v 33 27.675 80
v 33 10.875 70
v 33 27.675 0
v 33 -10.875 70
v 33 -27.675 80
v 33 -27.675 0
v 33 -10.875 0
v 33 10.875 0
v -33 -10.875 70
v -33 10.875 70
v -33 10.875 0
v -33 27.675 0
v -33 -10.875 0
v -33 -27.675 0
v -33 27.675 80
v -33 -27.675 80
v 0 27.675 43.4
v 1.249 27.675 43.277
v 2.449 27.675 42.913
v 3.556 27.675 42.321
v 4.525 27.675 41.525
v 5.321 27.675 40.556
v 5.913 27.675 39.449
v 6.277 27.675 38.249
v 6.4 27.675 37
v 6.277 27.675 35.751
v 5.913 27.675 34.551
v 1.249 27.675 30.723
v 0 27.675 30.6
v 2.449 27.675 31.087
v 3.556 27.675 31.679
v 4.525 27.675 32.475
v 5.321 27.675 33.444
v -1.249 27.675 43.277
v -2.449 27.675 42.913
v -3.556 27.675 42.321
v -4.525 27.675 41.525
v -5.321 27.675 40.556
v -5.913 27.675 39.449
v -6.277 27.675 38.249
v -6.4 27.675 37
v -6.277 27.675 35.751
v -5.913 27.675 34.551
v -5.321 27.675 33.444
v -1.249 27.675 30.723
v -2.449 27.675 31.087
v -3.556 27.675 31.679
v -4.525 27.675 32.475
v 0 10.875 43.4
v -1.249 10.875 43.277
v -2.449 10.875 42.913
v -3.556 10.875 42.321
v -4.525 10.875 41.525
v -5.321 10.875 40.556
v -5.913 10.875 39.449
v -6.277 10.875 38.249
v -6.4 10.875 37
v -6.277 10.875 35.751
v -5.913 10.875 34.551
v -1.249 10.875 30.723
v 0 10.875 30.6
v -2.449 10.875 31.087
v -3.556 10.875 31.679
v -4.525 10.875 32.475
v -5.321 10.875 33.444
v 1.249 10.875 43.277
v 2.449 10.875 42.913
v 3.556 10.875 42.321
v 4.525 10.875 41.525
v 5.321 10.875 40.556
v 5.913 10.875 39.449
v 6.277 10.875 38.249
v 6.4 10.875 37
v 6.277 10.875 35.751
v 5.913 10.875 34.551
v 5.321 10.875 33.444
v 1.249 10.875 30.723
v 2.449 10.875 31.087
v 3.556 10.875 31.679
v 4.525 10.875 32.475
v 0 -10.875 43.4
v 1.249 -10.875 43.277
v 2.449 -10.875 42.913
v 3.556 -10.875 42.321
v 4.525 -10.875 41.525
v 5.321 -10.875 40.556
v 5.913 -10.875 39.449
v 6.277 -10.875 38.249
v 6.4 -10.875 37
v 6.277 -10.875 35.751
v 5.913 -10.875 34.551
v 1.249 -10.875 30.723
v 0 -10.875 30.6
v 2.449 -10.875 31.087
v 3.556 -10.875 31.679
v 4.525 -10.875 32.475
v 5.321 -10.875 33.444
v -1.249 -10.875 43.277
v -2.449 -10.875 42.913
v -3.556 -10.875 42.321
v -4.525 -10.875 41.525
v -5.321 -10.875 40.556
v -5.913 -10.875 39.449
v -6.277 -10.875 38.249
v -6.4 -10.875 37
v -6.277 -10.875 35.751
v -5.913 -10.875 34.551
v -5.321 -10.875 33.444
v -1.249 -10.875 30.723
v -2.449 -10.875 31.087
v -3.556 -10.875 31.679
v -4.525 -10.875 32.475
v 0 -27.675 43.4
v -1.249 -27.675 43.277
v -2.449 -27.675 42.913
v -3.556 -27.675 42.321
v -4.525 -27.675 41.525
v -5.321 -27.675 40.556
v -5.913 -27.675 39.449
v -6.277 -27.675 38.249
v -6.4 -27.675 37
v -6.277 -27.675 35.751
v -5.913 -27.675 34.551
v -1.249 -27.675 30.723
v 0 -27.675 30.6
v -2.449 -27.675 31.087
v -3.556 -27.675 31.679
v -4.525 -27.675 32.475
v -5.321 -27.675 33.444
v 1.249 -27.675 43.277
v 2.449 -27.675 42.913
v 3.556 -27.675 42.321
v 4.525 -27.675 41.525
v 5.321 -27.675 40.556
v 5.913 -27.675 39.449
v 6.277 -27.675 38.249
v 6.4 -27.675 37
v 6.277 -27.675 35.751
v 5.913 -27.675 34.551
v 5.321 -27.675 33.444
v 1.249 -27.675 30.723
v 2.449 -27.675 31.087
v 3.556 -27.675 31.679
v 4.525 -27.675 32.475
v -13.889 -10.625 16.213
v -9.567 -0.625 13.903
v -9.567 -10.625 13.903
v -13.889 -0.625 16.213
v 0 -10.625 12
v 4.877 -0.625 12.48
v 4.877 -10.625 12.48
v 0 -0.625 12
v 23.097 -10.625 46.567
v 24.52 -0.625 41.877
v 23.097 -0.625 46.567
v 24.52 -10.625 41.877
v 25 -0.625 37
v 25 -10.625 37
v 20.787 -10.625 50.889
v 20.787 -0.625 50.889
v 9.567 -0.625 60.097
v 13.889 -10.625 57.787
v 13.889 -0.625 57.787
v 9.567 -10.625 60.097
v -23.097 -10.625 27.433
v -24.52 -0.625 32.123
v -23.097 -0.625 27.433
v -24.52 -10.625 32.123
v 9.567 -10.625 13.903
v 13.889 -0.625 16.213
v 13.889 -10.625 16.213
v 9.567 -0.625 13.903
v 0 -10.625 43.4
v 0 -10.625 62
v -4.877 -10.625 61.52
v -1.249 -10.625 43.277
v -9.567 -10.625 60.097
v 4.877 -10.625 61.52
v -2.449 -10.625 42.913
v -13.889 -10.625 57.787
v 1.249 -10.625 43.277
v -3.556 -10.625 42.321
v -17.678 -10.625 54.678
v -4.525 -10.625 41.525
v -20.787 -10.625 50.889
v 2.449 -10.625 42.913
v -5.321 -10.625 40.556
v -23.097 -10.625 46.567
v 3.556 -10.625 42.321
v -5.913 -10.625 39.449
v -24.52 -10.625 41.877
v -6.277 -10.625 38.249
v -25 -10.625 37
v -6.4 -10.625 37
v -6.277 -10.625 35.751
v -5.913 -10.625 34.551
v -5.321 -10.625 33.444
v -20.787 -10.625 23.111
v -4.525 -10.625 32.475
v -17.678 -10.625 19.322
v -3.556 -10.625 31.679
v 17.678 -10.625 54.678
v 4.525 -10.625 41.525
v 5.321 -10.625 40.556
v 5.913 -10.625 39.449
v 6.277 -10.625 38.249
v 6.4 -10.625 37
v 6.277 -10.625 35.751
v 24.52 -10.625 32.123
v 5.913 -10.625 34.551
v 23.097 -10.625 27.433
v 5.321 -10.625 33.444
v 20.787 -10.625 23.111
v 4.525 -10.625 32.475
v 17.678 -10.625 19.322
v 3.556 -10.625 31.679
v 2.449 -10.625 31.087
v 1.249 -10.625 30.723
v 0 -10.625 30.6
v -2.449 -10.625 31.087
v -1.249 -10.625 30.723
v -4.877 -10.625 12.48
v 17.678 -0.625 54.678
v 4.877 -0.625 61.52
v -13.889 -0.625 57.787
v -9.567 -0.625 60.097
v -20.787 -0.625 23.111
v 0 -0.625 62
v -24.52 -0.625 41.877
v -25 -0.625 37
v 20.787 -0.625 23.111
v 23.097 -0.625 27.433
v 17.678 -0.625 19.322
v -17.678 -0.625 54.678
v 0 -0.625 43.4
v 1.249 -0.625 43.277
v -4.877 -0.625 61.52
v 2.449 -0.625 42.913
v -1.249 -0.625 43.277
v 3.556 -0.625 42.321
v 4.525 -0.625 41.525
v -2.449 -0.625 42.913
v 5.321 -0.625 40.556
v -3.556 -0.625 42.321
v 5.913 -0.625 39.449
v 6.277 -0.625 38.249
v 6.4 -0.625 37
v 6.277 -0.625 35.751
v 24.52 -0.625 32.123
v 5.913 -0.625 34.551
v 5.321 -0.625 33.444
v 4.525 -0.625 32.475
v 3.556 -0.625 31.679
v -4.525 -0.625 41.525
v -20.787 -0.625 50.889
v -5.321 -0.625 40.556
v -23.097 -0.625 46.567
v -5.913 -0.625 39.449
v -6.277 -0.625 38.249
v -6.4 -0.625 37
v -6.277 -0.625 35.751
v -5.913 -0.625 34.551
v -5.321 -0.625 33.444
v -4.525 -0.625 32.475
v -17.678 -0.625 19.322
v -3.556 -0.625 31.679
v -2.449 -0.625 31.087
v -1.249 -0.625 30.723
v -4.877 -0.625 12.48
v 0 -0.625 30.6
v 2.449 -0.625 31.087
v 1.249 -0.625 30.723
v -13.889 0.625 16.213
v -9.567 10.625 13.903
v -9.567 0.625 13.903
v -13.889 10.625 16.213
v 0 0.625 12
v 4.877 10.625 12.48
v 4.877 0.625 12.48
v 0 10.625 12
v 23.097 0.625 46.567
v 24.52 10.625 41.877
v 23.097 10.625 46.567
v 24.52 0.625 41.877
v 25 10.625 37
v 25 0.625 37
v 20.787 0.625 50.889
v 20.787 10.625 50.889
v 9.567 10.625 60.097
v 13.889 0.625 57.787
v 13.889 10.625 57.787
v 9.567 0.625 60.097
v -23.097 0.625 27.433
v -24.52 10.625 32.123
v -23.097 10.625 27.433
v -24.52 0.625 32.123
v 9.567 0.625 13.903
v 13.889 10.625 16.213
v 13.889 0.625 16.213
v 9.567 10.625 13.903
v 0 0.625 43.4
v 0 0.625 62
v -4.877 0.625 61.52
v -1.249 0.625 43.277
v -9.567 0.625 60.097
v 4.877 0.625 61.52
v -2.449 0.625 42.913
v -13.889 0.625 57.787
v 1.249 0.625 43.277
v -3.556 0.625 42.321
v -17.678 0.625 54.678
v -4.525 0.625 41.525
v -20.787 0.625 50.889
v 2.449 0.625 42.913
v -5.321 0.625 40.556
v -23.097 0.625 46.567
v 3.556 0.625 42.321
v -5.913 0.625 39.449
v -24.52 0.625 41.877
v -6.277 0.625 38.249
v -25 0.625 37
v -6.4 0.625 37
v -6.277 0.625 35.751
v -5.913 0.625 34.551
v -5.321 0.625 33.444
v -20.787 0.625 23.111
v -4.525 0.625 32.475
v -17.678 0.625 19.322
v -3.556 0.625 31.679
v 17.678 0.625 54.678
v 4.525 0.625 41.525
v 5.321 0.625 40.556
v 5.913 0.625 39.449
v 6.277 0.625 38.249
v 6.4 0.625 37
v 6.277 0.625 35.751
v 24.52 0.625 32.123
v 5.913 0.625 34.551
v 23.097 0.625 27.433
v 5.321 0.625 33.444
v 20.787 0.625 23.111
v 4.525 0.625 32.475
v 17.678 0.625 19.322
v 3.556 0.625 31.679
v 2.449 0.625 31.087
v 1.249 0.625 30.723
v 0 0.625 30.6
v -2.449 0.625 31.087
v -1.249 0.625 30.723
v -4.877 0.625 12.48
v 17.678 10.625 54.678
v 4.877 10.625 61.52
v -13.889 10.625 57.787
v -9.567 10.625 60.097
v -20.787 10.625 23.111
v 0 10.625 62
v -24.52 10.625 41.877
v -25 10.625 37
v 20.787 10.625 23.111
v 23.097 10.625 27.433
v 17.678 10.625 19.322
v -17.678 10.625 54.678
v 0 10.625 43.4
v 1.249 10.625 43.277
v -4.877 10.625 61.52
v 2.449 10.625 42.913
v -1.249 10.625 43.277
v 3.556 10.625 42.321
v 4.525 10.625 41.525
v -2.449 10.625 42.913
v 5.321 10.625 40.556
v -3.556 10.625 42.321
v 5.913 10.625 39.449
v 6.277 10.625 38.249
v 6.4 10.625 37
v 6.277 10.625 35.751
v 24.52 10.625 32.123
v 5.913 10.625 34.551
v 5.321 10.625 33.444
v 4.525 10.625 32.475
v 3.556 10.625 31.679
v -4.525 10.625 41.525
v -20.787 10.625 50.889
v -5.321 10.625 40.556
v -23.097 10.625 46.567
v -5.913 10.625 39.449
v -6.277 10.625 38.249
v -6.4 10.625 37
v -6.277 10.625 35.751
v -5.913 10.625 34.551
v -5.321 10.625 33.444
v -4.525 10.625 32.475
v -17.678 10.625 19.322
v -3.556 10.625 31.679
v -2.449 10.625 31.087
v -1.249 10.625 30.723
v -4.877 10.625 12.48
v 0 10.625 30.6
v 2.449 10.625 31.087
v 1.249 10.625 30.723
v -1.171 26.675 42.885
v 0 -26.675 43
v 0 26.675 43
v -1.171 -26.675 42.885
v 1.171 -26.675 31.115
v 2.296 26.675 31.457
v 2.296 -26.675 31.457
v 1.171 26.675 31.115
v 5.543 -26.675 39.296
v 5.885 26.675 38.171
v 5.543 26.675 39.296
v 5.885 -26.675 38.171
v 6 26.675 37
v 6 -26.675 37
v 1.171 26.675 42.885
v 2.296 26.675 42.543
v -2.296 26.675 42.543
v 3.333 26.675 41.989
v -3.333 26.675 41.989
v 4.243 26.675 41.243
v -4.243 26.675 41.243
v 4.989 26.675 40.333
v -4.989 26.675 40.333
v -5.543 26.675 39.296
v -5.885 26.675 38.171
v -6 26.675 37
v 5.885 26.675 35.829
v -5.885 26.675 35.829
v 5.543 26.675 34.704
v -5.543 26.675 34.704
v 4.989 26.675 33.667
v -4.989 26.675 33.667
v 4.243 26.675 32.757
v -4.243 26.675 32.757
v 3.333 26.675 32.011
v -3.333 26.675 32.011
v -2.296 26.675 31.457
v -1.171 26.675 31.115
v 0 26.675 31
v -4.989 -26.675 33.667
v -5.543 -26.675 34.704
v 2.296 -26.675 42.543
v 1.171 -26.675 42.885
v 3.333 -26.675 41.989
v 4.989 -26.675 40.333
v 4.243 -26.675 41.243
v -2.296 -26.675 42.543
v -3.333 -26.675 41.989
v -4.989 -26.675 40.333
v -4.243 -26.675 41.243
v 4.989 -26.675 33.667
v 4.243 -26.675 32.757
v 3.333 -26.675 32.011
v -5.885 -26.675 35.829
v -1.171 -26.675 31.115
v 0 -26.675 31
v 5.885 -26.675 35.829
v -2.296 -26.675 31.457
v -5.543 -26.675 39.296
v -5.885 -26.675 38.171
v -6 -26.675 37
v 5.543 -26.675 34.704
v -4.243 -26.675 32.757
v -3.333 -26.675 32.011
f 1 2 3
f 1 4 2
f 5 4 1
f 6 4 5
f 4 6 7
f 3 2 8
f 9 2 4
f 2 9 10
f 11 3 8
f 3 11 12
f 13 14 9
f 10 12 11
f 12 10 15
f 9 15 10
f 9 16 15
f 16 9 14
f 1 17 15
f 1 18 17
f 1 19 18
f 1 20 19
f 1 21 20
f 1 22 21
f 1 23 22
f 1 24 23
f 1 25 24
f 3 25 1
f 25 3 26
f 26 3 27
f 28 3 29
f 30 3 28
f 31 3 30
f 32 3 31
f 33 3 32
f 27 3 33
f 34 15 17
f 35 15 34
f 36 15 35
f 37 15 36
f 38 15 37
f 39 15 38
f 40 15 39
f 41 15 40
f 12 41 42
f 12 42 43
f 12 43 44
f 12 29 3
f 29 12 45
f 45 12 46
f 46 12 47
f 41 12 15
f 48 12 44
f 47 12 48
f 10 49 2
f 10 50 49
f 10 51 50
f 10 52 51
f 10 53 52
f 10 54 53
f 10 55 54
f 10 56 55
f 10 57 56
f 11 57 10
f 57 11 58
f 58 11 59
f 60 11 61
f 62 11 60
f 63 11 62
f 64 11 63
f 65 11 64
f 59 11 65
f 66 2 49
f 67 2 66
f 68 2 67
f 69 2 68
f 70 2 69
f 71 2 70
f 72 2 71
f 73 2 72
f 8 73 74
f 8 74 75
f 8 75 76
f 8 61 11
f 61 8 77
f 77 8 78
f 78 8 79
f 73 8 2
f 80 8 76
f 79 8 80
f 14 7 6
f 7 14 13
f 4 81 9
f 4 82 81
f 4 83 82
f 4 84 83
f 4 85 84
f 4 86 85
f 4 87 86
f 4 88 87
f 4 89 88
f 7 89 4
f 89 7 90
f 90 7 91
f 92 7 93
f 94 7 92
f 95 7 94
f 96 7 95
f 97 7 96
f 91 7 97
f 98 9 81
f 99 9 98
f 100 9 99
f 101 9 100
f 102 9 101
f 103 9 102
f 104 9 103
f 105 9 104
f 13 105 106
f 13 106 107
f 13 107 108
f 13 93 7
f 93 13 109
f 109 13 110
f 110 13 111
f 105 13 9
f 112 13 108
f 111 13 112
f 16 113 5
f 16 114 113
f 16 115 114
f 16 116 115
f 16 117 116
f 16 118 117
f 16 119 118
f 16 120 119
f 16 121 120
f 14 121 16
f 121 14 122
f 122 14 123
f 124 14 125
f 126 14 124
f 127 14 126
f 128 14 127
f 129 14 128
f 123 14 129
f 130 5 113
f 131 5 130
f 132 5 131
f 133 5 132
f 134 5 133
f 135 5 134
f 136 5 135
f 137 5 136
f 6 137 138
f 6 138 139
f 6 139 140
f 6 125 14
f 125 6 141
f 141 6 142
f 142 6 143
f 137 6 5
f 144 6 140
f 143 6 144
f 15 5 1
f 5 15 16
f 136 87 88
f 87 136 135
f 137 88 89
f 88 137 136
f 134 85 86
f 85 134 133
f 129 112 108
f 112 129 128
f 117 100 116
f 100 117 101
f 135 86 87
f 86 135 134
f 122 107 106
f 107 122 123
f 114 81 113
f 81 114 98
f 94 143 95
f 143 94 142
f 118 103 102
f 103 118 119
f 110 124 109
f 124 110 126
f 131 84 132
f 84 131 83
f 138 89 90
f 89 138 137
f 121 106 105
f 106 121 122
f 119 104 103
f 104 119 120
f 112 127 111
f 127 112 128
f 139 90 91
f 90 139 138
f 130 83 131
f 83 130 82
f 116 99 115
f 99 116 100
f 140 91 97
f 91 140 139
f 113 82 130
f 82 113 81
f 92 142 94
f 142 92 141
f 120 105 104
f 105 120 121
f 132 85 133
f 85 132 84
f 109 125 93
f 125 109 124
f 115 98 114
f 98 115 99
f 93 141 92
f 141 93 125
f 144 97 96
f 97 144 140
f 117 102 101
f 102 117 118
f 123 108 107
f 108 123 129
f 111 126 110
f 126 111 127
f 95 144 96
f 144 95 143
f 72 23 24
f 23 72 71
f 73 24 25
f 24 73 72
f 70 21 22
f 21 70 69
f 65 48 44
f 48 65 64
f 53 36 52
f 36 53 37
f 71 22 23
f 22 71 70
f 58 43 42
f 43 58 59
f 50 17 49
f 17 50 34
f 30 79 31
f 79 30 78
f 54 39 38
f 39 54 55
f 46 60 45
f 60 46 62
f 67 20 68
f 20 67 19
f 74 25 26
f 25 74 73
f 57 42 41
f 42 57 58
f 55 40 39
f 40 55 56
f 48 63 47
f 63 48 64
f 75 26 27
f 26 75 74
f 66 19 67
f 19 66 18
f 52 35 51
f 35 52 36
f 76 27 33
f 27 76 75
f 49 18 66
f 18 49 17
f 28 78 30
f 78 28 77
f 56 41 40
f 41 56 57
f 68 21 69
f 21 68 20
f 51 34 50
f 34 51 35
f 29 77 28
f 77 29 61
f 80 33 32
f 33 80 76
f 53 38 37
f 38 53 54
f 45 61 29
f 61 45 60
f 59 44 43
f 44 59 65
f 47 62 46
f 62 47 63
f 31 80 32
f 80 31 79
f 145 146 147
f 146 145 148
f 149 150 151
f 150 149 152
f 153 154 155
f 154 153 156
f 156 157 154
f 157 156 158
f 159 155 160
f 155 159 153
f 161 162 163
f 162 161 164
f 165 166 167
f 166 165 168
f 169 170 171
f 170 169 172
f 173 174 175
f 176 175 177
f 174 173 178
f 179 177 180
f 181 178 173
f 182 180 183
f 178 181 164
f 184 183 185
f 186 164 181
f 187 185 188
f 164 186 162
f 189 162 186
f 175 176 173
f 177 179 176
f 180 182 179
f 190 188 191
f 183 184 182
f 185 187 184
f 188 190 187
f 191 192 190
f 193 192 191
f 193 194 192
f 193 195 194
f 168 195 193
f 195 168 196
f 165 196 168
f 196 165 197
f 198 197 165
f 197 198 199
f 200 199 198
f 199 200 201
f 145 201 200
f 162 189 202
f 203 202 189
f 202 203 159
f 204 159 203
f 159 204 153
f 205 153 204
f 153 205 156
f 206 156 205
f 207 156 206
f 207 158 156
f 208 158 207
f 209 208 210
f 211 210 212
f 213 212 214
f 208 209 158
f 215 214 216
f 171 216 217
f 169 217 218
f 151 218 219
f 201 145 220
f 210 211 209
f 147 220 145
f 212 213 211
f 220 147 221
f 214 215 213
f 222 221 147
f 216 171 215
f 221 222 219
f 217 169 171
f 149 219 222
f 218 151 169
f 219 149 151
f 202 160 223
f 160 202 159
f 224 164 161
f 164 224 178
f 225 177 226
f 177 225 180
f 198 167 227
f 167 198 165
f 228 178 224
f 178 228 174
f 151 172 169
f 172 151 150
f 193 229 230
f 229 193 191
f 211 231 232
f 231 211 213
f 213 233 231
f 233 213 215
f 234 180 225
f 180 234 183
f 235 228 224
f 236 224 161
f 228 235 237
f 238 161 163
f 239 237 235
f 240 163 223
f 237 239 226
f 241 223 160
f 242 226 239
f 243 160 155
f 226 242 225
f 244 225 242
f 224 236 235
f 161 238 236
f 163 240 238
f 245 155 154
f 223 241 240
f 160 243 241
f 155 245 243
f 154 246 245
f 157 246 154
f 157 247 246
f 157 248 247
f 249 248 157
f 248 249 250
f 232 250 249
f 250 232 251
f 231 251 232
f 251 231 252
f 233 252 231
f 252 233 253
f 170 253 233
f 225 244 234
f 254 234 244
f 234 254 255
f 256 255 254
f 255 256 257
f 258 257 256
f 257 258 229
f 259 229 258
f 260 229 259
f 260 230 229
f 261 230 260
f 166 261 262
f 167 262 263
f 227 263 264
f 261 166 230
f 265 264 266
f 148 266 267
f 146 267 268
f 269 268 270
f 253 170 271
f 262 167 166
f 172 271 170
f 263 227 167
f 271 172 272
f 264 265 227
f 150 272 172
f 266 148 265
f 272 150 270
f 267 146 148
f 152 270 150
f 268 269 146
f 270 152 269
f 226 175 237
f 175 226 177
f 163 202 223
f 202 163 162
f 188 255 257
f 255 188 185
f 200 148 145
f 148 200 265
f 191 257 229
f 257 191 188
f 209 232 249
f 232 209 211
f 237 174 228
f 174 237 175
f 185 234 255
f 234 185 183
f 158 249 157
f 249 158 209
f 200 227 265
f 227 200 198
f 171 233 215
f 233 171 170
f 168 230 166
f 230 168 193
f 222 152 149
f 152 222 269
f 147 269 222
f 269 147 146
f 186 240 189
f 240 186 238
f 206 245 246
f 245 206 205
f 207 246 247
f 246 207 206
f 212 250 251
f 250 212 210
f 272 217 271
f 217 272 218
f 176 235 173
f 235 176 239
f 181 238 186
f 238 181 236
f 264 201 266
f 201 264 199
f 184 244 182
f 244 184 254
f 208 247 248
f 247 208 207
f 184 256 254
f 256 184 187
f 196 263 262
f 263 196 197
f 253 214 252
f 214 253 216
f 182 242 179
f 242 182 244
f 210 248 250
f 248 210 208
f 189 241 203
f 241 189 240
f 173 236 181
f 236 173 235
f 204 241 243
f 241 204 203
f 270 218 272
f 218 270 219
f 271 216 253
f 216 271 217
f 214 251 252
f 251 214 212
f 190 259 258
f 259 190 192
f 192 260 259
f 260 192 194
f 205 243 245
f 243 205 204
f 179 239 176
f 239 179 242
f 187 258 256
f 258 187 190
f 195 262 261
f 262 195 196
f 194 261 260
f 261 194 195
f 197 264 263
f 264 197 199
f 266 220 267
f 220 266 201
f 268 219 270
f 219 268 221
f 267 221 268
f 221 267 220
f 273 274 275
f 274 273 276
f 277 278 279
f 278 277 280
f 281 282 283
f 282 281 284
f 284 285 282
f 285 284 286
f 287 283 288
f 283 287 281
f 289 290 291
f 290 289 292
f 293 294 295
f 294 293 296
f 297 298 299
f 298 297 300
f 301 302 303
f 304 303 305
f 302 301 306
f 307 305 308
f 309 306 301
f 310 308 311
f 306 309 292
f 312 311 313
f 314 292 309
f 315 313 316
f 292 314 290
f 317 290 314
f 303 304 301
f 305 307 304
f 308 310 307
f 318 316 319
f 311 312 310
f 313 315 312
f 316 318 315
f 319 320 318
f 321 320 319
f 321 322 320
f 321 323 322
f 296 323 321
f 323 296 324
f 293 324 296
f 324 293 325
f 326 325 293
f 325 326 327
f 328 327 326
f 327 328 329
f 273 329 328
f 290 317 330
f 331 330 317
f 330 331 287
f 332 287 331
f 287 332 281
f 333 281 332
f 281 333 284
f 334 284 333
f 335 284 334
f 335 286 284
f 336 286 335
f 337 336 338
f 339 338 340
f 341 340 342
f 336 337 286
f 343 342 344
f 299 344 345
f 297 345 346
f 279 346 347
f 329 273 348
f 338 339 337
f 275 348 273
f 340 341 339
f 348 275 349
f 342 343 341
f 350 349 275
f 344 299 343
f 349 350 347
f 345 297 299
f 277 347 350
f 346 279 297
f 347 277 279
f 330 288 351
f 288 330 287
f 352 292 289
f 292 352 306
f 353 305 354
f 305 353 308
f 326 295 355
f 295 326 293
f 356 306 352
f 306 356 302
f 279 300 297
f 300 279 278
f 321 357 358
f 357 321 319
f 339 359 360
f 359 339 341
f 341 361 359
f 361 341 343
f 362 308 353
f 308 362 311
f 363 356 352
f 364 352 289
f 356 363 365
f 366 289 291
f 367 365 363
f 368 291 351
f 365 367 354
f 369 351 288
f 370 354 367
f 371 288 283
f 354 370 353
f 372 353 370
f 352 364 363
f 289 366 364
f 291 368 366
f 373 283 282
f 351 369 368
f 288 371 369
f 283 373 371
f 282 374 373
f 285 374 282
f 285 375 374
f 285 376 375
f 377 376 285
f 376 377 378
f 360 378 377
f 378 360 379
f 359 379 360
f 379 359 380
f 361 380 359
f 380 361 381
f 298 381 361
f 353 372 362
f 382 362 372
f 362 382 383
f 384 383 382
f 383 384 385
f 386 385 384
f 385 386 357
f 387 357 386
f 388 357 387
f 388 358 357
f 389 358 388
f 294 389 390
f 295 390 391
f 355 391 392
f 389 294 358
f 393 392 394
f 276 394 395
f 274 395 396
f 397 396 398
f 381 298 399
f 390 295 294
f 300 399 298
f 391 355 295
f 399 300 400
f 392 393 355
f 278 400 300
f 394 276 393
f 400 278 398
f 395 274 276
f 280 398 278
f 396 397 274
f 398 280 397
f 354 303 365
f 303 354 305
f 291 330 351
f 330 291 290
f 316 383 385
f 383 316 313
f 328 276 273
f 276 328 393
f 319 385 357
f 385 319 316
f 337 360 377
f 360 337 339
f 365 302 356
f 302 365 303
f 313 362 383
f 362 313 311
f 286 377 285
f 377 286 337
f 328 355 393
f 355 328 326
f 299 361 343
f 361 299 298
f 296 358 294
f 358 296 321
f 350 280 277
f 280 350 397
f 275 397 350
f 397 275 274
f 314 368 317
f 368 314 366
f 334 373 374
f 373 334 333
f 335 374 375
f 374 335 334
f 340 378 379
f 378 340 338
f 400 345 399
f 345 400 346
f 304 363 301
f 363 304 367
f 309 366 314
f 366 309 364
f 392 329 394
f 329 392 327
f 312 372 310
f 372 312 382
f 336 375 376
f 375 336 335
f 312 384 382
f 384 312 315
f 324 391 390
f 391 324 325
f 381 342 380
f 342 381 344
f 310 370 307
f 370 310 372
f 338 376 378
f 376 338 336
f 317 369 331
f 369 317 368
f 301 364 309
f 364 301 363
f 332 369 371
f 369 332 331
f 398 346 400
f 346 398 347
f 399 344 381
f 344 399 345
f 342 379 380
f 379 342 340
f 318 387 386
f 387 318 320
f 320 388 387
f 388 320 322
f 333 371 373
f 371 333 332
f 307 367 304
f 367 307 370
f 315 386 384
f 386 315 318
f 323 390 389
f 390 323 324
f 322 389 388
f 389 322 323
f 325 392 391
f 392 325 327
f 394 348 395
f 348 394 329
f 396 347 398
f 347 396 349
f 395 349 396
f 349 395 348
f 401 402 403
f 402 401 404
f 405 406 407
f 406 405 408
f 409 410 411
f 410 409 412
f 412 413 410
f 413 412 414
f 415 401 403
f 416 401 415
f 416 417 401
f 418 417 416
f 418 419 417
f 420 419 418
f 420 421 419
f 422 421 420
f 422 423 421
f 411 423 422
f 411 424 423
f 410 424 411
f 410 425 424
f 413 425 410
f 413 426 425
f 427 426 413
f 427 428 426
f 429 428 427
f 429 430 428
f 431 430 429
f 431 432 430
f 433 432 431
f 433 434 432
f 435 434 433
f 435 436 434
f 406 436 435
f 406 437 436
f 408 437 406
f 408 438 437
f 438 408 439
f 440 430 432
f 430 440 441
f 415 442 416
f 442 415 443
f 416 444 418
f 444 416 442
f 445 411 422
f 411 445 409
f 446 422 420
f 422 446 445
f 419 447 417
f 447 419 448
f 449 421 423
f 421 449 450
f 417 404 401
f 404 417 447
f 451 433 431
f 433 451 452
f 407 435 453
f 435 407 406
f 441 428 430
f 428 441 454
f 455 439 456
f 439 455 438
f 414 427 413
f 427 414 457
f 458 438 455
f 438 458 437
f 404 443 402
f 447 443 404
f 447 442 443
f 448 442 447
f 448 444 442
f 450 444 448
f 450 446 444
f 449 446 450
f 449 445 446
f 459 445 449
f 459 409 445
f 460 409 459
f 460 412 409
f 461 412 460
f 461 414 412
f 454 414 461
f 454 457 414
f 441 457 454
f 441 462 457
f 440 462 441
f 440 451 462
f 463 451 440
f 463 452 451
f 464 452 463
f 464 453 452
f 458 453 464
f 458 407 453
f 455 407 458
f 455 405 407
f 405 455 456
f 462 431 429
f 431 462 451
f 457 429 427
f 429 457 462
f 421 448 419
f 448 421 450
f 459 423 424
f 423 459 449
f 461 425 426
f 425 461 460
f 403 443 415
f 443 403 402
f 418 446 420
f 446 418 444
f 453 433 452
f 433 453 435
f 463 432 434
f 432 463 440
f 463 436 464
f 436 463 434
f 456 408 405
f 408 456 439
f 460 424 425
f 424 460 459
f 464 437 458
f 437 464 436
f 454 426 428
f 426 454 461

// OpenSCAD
$fn = 32;

// ------------------------------------------------------------------------
// Trolley wheel set: wheels d50, fork 70 mm tall
// Every part is its own module, assembly() places every instance.
// ------------------------------------------------------------------------

// --- part 1 ---
module trolley_fork() {
  difference() {
    union() {
      translate([-33, 10.875, 0]) cube([66, 16.8, 70]);
      translate([-33, -27.675, 0]) cube([66, 16.8, 70]);
      translate([-33, -27.675, 70]) cube([66, 55.35, 10]);
    }
    translate([0, -19.275, 37]) rotate([90, 0, 0]) cylinder(h = 18.8, d = 12.8, center = true);
    translate([0, 19.275, 37]) rotate([90, 0, 0]) cylinder(h = 18.8, d = 12.8, center = true);
  }
}

// --- part 2 ---
module trolley_wheel() {
  difference() {
      translate([0, 0, 0]) cylinder(h = 10, d = 50);
      translate([0, 0, -1]) cylinder(h = 12, d = 12.8);
    }
}

// --- part 3 ---
module trolley_axle() {
  translate([0, 0, -26.675]) cylinder(h = 53.35, d = 12);
}

// --- assembly ---
module assembly() {
  color([0.80, 0.24, 0.20]) translate([0, 0, 0]) rotate([0, 0, 0]) trolley_fork();
  color([0.20, 0.45, 0.75]) translate([0, -0.625, 37]) rotate([90, 0, 0]) trolley_wheel();
  color([0.25, 0.62, 0.32]) translate([0, 10.625, 37]) rotate([90, 0, 0]) trolley_wheel();
  color([0.92, 0.70, 0.18]) translate([0, 0, 37]) rotate([90, 0, 0]) trolley_axle();
}

assembly();
